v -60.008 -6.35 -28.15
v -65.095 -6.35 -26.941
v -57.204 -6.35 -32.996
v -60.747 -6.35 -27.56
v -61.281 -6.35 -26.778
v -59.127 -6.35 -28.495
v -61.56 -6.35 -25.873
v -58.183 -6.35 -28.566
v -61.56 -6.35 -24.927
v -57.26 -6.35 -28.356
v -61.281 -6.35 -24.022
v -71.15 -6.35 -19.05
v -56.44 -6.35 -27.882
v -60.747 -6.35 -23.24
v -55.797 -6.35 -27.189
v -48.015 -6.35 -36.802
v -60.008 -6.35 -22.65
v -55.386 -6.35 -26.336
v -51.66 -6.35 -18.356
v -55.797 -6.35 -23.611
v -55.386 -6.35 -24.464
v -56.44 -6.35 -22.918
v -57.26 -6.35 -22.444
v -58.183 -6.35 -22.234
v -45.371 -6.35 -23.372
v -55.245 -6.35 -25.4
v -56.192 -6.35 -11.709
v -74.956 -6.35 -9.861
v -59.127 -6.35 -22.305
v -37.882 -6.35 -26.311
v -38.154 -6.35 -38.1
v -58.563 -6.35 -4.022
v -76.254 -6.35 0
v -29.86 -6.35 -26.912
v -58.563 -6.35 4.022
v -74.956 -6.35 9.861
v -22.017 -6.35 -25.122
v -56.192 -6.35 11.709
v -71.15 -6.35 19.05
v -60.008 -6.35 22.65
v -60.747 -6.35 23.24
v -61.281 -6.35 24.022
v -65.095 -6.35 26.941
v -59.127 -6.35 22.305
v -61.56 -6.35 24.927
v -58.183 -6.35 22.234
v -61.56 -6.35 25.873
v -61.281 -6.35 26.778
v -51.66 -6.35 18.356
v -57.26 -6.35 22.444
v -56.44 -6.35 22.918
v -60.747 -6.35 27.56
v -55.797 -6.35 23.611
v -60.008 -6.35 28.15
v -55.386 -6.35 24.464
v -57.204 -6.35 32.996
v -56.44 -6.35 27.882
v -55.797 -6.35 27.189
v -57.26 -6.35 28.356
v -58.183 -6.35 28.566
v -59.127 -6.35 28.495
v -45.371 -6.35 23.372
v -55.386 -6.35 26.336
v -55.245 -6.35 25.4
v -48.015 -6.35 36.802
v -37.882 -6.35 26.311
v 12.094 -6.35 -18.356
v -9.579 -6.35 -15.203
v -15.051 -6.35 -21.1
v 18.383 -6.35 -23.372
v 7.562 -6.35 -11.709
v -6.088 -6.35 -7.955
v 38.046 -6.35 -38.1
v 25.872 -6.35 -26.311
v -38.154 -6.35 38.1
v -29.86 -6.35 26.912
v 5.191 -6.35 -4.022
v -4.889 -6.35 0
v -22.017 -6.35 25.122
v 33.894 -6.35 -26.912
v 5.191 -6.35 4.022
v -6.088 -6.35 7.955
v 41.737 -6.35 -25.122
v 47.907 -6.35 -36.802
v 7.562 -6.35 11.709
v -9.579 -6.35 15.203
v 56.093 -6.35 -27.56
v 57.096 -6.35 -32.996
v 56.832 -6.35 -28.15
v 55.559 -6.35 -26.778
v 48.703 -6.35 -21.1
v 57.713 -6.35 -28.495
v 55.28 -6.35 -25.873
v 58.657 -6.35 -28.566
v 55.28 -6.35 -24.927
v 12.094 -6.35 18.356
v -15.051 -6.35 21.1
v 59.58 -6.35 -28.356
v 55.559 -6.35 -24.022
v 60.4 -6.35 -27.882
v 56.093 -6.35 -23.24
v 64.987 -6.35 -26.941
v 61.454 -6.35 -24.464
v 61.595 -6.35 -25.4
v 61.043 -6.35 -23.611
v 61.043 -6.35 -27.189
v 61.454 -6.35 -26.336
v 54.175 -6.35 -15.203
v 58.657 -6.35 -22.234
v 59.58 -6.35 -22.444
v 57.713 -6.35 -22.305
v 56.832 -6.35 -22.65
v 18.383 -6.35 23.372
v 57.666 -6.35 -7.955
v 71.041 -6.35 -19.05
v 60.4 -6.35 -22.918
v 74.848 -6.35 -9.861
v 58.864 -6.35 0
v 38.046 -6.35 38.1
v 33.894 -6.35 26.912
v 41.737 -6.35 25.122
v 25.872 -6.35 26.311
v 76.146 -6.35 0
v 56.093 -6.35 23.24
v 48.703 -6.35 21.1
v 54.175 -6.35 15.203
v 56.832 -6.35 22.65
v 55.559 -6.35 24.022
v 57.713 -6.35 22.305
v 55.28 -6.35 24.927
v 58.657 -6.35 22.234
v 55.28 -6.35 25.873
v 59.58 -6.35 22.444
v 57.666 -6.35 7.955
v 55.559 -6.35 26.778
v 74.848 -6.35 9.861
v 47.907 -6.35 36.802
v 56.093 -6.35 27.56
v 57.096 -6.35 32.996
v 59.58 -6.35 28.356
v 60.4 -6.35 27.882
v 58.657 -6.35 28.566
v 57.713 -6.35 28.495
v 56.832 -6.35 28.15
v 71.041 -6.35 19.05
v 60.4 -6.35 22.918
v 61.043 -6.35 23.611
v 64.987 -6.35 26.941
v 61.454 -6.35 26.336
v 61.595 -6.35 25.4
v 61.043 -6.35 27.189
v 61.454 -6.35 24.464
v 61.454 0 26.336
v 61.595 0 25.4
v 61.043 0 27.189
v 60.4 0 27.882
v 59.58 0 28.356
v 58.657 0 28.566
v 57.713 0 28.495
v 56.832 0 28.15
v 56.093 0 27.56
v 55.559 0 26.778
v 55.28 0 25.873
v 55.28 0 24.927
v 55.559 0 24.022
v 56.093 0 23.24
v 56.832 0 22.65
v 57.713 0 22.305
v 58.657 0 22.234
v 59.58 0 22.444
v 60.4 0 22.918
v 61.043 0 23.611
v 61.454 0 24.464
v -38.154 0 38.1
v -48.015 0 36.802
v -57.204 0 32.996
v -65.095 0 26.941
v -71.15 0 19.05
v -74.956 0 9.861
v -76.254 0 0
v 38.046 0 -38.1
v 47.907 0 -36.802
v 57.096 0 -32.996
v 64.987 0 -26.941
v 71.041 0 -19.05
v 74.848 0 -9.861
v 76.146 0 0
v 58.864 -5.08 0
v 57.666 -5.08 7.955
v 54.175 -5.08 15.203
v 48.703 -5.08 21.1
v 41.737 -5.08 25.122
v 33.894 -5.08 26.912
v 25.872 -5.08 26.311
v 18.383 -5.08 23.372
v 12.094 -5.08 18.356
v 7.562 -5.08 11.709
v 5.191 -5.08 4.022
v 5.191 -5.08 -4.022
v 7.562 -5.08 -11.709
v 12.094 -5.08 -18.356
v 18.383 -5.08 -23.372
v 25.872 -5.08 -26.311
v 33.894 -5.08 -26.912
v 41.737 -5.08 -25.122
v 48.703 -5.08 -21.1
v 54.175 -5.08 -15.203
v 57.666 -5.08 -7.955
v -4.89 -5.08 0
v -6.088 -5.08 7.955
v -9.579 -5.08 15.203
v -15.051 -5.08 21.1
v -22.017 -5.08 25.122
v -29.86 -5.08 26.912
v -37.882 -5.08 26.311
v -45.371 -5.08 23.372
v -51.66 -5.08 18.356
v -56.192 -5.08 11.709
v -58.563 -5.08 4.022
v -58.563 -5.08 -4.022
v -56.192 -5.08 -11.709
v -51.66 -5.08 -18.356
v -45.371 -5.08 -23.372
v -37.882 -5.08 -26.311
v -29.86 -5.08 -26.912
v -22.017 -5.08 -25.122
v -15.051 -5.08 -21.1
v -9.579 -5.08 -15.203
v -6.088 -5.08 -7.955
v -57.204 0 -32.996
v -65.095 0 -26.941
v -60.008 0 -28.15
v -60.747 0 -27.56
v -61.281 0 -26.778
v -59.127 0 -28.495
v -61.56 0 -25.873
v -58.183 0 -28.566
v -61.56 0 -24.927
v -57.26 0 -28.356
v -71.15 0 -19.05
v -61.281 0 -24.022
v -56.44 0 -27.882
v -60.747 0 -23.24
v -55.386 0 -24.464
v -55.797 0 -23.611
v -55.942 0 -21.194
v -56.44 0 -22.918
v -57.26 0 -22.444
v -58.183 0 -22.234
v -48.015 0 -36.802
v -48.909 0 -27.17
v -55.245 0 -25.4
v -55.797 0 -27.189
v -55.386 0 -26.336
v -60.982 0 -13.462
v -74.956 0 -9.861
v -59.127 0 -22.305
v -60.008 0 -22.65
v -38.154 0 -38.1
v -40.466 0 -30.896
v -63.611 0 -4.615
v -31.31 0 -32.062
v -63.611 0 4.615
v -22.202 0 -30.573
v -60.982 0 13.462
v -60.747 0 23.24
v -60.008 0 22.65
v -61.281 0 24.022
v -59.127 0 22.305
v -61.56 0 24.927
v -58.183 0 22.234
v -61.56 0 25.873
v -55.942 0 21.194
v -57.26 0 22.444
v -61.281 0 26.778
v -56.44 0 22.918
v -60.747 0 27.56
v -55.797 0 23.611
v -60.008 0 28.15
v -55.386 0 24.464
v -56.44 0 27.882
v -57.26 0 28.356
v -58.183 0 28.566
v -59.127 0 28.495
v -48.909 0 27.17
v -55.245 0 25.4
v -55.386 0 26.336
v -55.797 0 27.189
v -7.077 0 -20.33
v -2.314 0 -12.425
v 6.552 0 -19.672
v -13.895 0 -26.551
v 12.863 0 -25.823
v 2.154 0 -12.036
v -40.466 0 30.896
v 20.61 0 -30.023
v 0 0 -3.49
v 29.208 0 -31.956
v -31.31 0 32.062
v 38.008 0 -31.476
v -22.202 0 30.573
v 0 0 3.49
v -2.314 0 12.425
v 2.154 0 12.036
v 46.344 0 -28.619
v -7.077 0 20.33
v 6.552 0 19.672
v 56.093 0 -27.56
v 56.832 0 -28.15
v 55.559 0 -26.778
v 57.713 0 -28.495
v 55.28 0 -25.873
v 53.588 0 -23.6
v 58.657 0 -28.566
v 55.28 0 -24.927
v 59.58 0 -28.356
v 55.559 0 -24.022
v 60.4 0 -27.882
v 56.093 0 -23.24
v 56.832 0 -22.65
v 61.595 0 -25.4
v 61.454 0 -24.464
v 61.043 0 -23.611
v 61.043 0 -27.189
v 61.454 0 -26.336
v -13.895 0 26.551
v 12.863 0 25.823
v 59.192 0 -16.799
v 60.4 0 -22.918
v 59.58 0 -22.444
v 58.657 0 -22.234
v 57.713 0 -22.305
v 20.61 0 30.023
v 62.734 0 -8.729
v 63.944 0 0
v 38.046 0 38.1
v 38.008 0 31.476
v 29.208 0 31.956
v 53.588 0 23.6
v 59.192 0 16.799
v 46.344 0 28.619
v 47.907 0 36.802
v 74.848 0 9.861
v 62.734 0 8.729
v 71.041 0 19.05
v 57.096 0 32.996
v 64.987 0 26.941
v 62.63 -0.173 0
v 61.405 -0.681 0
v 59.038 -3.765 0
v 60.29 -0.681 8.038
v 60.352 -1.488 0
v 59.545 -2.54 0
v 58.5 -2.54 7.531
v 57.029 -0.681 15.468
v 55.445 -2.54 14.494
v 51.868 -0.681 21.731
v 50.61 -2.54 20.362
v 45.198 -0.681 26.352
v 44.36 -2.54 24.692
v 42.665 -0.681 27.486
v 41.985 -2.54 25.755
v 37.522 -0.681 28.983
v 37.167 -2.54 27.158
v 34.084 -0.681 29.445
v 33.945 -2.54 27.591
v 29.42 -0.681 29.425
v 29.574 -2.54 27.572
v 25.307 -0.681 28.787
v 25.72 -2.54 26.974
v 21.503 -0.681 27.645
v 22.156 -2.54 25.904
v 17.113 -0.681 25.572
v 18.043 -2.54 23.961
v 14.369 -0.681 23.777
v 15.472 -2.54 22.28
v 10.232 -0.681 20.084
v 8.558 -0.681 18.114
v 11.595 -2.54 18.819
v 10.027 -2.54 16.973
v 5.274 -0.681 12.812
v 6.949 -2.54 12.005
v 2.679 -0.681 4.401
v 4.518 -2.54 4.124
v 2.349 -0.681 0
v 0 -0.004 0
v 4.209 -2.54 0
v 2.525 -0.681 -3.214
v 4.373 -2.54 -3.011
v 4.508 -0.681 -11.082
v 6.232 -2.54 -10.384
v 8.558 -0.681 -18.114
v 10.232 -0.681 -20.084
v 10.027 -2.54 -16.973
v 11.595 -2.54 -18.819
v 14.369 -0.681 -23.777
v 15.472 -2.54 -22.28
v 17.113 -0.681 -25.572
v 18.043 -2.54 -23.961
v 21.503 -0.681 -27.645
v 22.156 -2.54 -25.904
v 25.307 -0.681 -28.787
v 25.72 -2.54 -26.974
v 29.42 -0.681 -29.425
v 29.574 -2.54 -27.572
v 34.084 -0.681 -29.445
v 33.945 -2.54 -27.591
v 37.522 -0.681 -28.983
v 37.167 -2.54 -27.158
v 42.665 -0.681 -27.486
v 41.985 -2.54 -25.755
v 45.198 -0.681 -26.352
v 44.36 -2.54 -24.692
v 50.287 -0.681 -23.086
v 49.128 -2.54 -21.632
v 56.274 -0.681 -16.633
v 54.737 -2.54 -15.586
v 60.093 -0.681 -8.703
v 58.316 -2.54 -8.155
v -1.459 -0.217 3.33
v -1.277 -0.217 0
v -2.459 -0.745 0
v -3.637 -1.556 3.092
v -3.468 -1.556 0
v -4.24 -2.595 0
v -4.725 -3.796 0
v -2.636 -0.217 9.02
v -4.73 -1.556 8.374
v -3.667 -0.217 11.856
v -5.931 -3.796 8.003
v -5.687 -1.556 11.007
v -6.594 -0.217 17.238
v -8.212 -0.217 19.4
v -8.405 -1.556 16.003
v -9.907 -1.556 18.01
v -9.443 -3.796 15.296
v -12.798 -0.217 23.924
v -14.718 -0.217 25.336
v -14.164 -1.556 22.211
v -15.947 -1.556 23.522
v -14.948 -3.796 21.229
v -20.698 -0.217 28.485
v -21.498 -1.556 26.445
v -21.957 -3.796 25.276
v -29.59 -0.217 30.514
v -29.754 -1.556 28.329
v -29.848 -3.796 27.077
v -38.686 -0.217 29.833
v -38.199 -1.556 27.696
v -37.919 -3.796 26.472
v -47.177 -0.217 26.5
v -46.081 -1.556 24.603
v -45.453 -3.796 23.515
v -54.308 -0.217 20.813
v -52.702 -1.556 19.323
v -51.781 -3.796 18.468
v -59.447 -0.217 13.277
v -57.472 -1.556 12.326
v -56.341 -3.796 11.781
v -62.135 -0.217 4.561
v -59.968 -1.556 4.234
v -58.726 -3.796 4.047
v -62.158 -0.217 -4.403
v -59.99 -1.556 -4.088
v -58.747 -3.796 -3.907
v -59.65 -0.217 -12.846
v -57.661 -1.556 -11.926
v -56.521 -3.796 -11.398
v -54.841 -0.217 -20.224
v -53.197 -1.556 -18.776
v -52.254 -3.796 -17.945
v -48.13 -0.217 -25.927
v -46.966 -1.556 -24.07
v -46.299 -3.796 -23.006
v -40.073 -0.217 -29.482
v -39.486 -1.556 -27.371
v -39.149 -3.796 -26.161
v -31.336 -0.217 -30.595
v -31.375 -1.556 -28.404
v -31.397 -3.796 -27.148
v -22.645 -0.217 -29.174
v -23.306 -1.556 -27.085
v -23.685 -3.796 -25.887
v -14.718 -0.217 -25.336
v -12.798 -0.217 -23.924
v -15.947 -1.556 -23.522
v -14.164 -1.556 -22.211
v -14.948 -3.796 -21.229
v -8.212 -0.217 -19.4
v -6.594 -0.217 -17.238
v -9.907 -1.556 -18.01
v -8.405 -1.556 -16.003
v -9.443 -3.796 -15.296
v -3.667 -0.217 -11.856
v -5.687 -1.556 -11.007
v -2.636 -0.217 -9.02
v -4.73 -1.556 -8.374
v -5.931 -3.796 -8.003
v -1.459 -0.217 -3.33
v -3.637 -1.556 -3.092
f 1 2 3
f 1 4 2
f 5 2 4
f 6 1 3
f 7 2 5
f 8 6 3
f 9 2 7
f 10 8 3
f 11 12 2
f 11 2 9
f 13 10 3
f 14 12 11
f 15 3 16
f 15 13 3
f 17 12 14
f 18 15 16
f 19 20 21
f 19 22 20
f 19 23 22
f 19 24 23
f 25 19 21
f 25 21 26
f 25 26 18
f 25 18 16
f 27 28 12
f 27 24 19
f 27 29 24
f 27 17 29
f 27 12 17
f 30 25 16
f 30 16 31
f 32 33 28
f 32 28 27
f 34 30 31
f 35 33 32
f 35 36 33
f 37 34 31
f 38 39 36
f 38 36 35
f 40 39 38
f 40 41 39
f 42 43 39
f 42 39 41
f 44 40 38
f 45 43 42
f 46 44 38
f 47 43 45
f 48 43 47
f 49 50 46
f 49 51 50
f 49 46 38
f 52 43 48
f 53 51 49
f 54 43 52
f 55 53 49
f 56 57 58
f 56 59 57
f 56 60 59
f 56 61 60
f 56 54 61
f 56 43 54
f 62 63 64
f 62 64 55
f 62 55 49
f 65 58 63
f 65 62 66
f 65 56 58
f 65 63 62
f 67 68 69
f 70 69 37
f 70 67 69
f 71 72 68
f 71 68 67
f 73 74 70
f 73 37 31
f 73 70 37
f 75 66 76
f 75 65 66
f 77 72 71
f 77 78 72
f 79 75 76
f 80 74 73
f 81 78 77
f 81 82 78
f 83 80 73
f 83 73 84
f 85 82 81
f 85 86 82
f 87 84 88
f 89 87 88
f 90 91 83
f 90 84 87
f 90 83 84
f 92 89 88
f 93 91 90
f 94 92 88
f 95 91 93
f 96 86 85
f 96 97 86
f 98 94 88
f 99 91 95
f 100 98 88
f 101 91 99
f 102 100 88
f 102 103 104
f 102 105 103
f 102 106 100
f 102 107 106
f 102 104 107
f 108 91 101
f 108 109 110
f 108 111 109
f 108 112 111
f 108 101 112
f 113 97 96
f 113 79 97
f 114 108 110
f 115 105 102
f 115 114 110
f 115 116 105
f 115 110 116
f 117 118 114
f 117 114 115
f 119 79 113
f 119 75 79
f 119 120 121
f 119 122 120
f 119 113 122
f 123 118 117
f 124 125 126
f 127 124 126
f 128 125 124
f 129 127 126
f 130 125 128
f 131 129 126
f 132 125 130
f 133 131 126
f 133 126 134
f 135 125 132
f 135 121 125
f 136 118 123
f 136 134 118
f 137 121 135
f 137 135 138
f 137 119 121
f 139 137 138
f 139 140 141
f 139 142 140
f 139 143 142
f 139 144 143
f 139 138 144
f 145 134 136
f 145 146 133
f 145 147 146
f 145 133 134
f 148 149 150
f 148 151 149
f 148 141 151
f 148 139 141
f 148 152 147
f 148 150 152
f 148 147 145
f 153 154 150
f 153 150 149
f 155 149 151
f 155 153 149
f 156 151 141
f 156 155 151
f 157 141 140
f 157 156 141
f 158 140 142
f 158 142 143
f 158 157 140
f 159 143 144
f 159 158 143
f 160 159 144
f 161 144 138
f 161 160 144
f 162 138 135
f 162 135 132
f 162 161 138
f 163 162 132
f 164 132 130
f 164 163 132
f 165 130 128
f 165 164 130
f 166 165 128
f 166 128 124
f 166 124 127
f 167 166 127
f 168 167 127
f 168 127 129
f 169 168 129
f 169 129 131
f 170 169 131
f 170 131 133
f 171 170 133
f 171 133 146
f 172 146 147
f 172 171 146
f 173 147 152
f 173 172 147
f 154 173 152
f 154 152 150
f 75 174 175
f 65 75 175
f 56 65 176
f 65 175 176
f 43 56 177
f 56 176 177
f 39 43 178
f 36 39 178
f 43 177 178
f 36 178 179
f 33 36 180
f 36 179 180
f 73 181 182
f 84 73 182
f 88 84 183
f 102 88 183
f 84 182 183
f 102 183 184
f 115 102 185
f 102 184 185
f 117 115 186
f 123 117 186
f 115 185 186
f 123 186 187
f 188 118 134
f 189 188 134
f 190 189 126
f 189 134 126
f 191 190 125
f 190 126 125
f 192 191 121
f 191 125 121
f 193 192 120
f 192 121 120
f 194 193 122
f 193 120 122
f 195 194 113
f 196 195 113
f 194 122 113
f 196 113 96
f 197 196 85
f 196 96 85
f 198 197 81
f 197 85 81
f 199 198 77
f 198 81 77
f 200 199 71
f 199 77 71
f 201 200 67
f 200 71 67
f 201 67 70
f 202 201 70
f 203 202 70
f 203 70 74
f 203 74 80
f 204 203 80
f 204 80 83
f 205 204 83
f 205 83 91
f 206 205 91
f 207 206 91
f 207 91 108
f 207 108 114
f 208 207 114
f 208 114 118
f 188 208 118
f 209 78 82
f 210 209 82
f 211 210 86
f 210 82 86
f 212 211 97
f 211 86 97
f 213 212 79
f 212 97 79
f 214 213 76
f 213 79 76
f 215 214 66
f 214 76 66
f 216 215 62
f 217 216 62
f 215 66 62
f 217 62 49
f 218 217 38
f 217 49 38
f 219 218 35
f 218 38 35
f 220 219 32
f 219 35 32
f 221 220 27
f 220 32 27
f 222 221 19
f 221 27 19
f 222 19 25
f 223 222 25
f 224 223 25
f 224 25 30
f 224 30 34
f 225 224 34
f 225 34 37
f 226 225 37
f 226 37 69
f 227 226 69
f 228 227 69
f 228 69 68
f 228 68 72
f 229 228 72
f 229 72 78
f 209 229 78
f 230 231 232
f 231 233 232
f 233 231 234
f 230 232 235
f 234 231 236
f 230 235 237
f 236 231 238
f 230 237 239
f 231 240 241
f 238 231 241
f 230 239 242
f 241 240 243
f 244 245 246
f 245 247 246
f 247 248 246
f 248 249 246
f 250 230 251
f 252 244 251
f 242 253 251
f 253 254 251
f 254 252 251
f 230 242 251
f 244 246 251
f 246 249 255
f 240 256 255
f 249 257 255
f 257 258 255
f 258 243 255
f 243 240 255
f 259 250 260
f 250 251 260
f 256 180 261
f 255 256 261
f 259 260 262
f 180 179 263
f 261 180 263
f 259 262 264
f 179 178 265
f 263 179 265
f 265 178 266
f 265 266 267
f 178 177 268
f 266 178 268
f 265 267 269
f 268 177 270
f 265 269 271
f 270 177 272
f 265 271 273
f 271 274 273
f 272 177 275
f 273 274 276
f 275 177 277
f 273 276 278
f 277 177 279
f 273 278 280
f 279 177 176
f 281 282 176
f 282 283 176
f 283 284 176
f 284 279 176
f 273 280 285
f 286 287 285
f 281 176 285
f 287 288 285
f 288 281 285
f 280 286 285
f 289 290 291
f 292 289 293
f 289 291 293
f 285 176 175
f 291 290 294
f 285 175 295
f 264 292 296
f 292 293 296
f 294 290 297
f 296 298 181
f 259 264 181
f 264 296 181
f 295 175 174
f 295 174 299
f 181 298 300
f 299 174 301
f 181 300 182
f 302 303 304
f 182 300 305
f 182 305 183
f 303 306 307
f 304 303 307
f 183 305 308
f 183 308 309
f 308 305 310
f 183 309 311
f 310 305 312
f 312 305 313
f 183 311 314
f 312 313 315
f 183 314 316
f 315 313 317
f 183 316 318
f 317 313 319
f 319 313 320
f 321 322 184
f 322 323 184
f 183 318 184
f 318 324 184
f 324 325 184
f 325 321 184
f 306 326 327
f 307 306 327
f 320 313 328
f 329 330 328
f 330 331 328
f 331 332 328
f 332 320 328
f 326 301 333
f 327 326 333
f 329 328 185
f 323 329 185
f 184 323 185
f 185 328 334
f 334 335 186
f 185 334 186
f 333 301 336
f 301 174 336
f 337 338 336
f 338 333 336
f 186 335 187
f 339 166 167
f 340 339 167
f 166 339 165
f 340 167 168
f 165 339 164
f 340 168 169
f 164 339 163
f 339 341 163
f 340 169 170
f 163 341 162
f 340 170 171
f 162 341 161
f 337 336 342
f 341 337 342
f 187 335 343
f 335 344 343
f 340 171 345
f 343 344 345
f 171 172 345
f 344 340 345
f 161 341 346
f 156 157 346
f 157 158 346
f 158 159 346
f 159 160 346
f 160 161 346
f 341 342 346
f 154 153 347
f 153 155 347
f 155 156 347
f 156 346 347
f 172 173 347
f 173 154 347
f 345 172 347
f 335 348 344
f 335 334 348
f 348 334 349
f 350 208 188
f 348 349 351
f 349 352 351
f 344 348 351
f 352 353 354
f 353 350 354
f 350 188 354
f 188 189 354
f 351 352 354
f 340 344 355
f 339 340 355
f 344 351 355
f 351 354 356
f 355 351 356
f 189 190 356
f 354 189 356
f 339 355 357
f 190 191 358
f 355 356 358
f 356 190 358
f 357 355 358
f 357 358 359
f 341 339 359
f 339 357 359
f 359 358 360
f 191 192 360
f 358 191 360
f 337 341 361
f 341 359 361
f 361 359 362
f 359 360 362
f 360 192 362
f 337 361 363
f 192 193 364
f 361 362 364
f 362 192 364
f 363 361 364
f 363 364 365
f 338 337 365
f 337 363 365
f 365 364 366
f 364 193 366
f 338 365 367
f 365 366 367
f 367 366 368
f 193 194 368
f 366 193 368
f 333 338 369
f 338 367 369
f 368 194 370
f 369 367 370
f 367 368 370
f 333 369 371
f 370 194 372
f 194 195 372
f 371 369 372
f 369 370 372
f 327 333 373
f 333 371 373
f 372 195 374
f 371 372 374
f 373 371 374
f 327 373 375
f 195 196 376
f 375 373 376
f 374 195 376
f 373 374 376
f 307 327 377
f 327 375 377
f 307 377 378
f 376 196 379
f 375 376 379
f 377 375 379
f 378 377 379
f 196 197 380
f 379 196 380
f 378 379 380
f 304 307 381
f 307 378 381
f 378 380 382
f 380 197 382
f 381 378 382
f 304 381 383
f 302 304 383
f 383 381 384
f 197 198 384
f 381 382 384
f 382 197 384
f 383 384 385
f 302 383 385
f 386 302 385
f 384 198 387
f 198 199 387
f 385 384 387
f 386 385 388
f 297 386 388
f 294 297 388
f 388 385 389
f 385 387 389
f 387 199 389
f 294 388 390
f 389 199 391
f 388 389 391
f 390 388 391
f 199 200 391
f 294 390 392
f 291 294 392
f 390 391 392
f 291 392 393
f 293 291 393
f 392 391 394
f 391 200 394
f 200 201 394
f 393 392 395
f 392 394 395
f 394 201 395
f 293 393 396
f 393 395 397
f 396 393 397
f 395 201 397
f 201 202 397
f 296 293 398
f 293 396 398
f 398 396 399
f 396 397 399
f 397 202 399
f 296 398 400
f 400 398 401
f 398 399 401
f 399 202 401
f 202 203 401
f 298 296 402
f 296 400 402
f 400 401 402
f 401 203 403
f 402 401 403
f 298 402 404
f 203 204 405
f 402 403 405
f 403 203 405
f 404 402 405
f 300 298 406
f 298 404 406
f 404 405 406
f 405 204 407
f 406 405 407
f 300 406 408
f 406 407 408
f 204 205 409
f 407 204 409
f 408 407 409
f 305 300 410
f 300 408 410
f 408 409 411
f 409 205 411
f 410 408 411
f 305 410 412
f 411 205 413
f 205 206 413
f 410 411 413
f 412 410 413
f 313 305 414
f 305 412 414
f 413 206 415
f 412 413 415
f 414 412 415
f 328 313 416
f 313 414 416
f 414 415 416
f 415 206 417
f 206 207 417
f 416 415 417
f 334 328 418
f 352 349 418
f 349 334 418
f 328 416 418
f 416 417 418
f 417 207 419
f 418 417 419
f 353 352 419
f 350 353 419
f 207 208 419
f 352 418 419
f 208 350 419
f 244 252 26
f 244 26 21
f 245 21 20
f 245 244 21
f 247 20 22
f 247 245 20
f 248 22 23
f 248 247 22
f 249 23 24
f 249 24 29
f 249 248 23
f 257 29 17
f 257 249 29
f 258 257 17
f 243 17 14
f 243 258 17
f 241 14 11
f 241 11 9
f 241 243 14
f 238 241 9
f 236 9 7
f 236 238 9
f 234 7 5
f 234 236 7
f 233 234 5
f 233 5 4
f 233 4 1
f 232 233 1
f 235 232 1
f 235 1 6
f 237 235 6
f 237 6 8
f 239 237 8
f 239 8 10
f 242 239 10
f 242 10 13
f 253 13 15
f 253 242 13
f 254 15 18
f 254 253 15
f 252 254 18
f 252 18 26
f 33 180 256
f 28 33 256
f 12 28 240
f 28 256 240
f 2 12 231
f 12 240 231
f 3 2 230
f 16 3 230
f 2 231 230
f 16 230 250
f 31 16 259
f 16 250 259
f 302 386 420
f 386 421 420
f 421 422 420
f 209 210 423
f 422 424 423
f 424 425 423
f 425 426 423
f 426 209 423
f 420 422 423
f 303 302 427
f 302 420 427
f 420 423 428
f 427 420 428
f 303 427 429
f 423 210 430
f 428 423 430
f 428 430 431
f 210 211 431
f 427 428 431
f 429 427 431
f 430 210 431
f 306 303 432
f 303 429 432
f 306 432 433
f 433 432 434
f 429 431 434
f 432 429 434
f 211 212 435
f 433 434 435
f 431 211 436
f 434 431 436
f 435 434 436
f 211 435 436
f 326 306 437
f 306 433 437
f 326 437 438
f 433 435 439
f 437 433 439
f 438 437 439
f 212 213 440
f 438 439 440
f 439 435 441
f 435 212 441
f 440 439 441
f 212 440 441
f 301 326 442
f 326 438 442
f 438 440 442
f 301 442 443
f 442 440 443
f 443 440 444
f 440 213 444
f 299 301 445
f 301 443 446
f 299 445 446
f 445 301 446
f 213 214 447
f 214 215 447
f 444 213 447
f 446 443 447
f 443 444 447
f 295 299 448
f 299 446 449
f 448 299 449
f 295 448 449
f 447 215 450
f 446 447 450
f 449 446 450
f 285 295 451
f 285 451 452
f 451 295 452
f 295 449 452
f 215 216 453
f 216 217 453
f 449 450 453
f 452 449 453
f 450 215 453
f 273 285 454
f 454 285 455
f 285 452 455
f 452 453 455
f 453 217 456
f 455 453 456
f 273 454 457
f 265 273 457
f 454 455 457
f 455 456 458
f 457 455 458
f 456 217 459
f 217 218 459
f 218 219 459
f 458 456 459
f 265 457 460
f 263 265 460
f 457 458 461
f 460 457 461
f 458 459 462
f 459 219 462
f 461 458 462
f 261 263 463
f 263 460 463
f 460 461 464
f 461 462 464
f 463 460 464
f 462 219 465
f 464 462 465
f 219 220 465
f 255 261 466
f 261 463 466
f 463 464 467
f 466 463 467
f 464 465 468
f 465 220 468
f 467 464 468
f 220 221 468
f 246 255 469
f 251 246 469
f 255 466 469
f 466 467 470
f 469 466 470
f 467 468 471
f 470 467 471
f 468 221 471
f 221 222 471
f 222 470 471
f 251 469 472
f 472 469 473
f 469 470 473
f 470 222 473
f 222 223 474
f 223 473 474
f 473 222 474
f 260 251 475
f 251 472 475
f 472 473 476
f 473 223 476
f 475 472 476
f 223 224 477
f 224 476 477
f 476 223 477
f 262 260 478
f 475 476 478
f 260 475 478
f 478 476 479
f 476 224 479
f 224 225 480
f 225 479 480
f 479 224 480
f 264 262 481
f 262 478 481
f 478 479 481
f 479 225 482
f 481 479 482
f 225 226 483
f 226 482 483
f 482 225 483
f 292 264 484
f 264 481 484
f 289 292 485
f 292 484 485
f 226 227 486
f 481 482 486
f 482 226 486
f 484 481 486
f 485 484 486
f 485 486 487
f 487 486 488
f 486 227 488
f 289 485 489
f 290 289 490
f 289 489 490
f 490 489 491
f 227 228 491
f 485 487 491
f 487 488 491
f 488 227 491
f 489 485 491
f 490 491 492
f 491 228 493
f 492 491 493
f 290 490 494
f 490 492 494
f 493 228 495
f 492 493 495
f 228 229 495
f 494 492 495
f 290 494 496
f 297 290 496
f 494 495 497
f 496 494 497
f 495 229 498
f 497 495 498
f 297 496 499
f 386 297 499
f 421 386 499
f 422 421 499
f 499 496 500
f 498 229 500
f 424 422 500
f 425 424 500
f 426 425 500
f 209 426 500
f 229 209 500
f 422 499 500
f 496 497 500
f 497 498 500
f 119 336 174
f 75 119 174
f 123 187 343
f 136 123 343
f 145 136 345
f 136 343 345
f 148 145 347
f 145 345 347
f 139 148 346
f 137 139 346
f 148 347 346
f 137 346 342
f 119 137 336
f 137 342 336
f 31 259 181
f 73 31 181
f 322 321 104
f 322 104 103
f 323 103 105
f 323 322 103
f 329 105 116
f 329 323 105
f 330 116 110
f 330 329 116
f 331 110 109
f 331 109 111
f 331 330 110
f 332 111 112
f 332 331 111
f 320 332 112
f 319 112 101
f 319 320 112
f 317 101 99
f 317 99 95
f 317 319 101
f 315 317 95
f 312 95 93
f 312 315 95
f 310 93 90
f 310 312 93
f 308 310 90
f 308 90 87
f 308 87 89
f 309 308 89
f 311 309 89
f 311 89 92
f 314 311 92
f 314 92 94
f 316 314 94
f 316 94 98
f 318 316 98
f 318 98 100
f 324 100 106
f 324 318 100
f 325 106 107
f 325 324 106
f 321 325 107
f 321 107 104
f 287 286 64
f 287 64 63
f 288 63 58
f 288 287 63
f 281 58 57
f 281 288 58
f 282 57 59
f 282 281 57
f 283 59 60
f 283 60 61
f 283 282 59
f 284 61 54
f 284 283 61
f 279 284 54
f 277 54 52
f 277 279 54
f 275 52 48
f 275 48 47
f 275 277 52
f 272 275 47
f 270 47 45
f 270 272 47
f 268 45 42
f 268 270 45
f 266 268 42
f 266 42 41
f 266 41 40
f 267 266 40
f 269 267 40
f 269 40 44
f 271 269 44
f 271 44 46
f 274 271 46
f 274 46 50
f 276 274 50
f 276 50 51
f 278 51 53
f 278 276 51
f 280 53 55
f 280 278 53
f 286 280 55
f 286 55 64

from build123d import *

# Parameters (mm, degrees)
F0_R     = 3.175
F1_DEPTH = 6.35
F2_DEPTH = 6.35
F4_R     = 26.9875
F5_DEPTH = 25.4


# Not quite as in the source:
# - a fillet or chamfer that OpenCascade refuses, or shapes differently, is made with other operations: its cross-section is extruded or revolved along the edge and cut away or added


with BuildPart() as f1:
    # F0 (on Front) → F1 (new body)
    with BuildSketch(Plane.XZ):
        with BuildLine():
            ThreePointArc((-76.2542010712, 0), (-65.0949694344, -26.9407683632), (-38.1542010712, -38.1))
            Line((-38.1542010712, -38.1), (38.0457989288, -38.1))
            ThreePointArc((38.0457989288, -38.1), (64.986567292, -26.9407683632), (76.1457989288, 0))
            ThreePointArc((76.1457989288, 0), (64.986567292, 26.9407683632), (38.0457989288, 38.1))
            Line((38.0457989288, 38.1), (-38.1542010712, 38.1))
            ThreePointArc((-38.1542010712, 38.1), (-65.0949694344, 26.9407683632), (-76.2542010712, 0))
        make_face()
        with Locations((-58.42, -25.4)):
            Circle(F0_R, mode=Mode.SUBTRACT)
        with Locations((58.42, -25.4)):
            Circle(F0_R, mode=Mode.SUBTRACT)
        with Locations((-58.42, 25.4)):
            Circle(F0_R, mode=Mode.SUBTRACT)
        with BuildLine():
            ThreePointArc((-31.75, -31.75), (-63.5, 0), (-31.75, 31.75))
            Line((-31.75, 31.75), (31.75, 31.75))
            ThreePointArc((31.75, 31.75), (63.5, 0), (31.75, -31.75))
            Line((31.75, -31.75), (-31.75, -31.75))
        make_face(mode=Mode.SUBTRACT)
        with Locations((58.42, 25.4)):
            Circle(F0_R, mode=Mode.SUBTRACT)
    extrude(amount=F1_DEPTH)

    # F0 (on Front) → F2 (join)
    with BuildSketch(Plane.XZ):
        with BuildLine():
            Line((31.75, 31.75), (-31.75, 31.75))
            ThreePointArc((-31.75, 31.75), (-63.5, 0), (-31.75, -31.75))
            Line((-31.75, -31.75), (31.75, -31.75))
            ThreePointArc((31.75, -31.75), (63.5, 0), (31.75, 31.75))
        make_face()
    extrude(amount=F2_DEPTH)

    # F4 (on face) → F5 (cut)
    with BuildSketch(Plane.XZ.offset(6.35)):
        with Locations((-31.877, 0)):
            Circle(F4_R)
        with Locations((31.877, 0)):
            Circle(F4_R)
    extrude(amount=-F5_DEPTH, mode=Mode.SUBTRACT)

    # F6: fillet of radius 5.08 on 2 edges, made by hand

    # F6_s1 → F6_t2 (revolve, cut)
    with BuildSketch(Plane.XY):
        with BuildLine():
            ThreePointArc((63.9445, 0), (60.3523975516, -1.4878975516), (58.8645, -5.08))
            Line((58.8645, -5.08), (58.8645, 0))
            Line((58.8645, 0), (63.9445, 0))
        make_face()
    revolve(axis=Axis((31.877, 0, 0), (0, -1, 0)), mode=Mode.SUBTRACT)

    # F6_s3 → F6_t4 (revolve, cut)
    with BuildSketch(Plane.XY):
        with BuildLine():
            ThreePointArc((0.1905, 0), (-3.4016024484, -1.4878975516), (-4.8895, -5.08))
            Line((-4.8895, -5.08), (-4.8895, 0))
            Line((-4.8895, 0), (0.1905, 0))
        make_face()
    revolve(axis=Axis((-31.877, 0, 0), (0, -1, 0)), mode=Mode.SUBTRACT)


solid = f1.part
